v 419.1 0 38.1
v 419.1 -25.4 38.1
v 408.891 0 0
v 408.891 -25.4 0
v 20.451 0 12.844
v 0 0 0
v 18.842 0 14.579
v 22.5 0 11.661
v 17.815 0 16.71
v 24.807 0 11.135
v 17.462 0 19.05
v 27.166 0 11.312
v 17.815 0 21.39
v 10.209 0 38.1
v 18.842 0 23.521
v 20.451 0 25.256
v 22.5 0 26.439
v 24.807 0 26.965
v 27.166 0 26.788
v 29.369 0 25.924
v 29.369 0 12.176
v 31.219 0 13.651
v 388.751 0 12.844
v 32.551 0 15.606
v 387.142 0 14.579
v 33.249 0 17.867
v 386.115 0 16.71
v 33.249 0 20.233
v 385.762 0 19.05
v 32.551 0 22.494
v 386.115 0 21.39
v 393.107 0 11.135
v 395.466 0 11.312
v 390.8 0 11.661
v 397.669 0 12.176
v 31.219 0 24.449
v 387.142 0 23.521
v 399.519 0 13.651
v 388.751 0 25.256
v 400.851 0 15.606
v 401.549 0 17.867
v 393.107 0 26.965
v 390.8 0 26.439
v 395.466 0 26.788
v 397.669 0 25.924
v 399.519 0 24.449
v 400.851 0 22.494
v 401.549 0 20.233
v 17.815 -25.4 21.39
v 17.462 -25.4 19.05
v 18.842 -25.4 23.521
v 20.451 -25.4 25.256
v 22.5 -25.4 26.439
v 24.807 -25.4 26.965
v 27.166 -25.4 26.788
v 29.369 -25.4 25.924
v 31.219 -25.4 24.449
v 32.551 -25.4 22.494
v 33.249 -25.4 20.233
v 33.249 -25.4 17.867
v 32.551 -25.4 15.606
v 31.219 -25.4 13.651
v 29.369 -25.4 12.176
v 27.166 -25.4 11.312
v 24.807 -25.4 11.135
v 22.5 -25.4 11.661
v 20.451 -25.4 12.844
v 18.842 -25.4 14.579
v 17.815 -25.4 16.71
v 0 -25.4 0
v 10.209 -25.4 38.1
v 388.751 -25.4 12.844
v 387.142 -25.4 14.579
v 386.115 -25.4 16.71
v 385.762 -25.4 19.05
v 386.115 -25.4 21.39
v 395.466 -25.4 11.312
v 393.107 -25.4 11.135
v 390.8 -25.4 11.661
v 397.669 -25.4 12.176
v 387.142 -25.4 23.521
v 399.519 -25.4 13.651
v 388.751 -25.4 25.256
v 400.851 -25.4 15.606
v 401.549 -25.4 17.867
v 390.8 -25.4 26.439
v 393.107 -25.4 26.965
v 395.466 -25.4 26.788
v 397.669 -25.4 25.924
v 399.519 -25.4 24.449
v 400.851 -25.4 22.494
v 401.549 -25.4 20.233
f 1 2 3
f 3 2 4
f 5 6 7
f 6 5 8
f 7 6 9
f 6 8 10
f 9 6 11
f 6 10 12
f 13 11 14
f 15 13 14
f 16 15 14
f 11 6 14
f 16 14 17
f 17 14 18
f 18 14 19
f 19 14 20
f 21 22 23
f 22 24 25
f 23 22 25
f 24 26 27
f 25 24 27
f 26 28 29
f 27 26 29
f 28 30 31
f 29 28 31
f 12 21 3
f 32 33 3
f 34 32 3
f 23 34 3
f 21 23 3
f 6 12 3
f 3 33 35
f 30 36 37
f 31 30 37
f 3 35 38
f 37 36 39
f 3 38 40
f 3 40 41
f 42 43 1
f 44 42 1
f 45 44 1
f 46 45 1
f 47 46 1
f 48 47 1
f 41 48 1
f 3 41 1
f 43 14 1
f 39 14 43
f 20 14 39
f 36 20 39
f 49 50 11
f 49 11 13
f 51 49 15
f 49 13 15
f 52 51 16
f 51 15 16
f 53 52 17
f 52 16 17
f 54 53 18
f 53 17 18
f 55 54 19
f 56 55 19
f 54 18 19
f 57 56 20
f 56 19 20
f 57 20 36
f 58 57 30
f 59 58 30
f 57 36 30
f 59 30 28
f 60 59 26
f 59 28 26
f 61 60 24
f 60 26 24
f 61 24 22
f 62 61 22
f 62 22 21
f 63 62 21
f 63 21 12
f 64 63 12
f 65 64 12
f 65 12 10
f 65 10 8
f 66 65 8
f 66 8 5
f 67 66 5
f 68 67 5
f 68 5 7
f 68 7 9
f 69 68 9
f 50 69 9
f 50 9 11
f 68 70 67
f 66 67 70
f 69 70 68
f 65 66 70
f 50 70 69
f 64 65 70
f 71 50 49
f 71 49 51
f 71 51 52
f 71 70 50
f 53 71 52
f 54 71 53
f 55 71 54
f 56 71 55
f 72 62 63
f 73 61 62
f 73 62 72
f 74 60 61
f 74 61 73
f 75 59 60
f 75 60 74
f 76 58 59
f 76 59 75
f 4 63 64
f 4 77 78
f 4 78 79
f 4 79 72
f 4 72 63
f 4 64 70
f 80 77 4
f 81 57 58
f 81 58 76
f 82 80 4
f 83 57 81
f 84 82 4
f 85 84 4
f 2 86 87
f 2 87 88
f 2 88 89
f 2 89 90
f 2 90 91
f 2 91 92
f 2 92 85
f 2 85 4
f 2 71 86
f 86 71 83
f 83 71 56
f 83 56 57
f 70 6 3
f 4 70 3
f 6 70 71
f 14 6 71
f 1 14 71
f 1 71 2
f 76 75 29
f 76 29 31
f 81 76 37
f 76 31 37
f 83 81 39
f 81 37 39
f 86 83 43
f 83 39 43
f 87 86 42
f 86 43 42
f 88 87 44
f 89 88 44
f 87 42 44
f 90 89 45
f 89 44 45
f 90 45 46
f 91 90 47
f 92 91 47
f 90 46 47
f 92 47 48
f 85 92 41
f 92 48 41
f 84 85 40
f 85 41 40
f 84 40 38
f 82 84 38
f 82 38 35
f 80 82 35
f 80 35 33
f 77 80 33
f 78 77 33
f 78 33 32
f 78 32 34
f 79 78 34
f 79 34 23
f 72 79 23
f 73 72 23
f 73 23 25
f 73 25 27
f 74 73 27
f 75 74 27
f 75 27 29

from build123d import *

# Parameters (mm, degrees)
F0_W     = 419.1
F0_H     = 38.1
F1_DEPTH = 25.4
F3_D     = 15.875
F5_DEPTH = 50.8
F7_DEPTH = 50.8


# Not quite as in the source:
# - a feature names something its author has since deleted; it is built from what else it names


with BuildPart() as f1:
    # F0 (on Front) → F1 (new body)
    with BuildSketch(Plane.XZ):
        with Locations((209.55, 19.05)):
            Rectangle(F0_W, F0_H)
    extrude(amount=F1_DEPTH)

    # F3 (through all)
    with Locations(Plane.XZ.offset(25.4)):
        with Locations((25.4, 19.05), (393.7, 19.05)):
            Hole(F3_D / 2)

    # F4 (on face) → F5 (cut)
    with BuildSketch(Plane.XZ.offset(25.4)):
        Polygon((0, 38.1), (0, 0), (10.2088642316, 38.1), align=None)
    extrude(amount=-F5_DEPTH, mode=Mode.SUBTRACT)

    # F6 (on face) → F7 (cut)
    with BuildSketch(Plane.XZ.offset(25.4)):
        Polygon((419.1, 0), (419.1, 38.1), (408.8911357684, 0), align=None)
    extrude(amount=-F7_DEPTH, mode=Mode.SUBTRACT)


solid = f1.part
